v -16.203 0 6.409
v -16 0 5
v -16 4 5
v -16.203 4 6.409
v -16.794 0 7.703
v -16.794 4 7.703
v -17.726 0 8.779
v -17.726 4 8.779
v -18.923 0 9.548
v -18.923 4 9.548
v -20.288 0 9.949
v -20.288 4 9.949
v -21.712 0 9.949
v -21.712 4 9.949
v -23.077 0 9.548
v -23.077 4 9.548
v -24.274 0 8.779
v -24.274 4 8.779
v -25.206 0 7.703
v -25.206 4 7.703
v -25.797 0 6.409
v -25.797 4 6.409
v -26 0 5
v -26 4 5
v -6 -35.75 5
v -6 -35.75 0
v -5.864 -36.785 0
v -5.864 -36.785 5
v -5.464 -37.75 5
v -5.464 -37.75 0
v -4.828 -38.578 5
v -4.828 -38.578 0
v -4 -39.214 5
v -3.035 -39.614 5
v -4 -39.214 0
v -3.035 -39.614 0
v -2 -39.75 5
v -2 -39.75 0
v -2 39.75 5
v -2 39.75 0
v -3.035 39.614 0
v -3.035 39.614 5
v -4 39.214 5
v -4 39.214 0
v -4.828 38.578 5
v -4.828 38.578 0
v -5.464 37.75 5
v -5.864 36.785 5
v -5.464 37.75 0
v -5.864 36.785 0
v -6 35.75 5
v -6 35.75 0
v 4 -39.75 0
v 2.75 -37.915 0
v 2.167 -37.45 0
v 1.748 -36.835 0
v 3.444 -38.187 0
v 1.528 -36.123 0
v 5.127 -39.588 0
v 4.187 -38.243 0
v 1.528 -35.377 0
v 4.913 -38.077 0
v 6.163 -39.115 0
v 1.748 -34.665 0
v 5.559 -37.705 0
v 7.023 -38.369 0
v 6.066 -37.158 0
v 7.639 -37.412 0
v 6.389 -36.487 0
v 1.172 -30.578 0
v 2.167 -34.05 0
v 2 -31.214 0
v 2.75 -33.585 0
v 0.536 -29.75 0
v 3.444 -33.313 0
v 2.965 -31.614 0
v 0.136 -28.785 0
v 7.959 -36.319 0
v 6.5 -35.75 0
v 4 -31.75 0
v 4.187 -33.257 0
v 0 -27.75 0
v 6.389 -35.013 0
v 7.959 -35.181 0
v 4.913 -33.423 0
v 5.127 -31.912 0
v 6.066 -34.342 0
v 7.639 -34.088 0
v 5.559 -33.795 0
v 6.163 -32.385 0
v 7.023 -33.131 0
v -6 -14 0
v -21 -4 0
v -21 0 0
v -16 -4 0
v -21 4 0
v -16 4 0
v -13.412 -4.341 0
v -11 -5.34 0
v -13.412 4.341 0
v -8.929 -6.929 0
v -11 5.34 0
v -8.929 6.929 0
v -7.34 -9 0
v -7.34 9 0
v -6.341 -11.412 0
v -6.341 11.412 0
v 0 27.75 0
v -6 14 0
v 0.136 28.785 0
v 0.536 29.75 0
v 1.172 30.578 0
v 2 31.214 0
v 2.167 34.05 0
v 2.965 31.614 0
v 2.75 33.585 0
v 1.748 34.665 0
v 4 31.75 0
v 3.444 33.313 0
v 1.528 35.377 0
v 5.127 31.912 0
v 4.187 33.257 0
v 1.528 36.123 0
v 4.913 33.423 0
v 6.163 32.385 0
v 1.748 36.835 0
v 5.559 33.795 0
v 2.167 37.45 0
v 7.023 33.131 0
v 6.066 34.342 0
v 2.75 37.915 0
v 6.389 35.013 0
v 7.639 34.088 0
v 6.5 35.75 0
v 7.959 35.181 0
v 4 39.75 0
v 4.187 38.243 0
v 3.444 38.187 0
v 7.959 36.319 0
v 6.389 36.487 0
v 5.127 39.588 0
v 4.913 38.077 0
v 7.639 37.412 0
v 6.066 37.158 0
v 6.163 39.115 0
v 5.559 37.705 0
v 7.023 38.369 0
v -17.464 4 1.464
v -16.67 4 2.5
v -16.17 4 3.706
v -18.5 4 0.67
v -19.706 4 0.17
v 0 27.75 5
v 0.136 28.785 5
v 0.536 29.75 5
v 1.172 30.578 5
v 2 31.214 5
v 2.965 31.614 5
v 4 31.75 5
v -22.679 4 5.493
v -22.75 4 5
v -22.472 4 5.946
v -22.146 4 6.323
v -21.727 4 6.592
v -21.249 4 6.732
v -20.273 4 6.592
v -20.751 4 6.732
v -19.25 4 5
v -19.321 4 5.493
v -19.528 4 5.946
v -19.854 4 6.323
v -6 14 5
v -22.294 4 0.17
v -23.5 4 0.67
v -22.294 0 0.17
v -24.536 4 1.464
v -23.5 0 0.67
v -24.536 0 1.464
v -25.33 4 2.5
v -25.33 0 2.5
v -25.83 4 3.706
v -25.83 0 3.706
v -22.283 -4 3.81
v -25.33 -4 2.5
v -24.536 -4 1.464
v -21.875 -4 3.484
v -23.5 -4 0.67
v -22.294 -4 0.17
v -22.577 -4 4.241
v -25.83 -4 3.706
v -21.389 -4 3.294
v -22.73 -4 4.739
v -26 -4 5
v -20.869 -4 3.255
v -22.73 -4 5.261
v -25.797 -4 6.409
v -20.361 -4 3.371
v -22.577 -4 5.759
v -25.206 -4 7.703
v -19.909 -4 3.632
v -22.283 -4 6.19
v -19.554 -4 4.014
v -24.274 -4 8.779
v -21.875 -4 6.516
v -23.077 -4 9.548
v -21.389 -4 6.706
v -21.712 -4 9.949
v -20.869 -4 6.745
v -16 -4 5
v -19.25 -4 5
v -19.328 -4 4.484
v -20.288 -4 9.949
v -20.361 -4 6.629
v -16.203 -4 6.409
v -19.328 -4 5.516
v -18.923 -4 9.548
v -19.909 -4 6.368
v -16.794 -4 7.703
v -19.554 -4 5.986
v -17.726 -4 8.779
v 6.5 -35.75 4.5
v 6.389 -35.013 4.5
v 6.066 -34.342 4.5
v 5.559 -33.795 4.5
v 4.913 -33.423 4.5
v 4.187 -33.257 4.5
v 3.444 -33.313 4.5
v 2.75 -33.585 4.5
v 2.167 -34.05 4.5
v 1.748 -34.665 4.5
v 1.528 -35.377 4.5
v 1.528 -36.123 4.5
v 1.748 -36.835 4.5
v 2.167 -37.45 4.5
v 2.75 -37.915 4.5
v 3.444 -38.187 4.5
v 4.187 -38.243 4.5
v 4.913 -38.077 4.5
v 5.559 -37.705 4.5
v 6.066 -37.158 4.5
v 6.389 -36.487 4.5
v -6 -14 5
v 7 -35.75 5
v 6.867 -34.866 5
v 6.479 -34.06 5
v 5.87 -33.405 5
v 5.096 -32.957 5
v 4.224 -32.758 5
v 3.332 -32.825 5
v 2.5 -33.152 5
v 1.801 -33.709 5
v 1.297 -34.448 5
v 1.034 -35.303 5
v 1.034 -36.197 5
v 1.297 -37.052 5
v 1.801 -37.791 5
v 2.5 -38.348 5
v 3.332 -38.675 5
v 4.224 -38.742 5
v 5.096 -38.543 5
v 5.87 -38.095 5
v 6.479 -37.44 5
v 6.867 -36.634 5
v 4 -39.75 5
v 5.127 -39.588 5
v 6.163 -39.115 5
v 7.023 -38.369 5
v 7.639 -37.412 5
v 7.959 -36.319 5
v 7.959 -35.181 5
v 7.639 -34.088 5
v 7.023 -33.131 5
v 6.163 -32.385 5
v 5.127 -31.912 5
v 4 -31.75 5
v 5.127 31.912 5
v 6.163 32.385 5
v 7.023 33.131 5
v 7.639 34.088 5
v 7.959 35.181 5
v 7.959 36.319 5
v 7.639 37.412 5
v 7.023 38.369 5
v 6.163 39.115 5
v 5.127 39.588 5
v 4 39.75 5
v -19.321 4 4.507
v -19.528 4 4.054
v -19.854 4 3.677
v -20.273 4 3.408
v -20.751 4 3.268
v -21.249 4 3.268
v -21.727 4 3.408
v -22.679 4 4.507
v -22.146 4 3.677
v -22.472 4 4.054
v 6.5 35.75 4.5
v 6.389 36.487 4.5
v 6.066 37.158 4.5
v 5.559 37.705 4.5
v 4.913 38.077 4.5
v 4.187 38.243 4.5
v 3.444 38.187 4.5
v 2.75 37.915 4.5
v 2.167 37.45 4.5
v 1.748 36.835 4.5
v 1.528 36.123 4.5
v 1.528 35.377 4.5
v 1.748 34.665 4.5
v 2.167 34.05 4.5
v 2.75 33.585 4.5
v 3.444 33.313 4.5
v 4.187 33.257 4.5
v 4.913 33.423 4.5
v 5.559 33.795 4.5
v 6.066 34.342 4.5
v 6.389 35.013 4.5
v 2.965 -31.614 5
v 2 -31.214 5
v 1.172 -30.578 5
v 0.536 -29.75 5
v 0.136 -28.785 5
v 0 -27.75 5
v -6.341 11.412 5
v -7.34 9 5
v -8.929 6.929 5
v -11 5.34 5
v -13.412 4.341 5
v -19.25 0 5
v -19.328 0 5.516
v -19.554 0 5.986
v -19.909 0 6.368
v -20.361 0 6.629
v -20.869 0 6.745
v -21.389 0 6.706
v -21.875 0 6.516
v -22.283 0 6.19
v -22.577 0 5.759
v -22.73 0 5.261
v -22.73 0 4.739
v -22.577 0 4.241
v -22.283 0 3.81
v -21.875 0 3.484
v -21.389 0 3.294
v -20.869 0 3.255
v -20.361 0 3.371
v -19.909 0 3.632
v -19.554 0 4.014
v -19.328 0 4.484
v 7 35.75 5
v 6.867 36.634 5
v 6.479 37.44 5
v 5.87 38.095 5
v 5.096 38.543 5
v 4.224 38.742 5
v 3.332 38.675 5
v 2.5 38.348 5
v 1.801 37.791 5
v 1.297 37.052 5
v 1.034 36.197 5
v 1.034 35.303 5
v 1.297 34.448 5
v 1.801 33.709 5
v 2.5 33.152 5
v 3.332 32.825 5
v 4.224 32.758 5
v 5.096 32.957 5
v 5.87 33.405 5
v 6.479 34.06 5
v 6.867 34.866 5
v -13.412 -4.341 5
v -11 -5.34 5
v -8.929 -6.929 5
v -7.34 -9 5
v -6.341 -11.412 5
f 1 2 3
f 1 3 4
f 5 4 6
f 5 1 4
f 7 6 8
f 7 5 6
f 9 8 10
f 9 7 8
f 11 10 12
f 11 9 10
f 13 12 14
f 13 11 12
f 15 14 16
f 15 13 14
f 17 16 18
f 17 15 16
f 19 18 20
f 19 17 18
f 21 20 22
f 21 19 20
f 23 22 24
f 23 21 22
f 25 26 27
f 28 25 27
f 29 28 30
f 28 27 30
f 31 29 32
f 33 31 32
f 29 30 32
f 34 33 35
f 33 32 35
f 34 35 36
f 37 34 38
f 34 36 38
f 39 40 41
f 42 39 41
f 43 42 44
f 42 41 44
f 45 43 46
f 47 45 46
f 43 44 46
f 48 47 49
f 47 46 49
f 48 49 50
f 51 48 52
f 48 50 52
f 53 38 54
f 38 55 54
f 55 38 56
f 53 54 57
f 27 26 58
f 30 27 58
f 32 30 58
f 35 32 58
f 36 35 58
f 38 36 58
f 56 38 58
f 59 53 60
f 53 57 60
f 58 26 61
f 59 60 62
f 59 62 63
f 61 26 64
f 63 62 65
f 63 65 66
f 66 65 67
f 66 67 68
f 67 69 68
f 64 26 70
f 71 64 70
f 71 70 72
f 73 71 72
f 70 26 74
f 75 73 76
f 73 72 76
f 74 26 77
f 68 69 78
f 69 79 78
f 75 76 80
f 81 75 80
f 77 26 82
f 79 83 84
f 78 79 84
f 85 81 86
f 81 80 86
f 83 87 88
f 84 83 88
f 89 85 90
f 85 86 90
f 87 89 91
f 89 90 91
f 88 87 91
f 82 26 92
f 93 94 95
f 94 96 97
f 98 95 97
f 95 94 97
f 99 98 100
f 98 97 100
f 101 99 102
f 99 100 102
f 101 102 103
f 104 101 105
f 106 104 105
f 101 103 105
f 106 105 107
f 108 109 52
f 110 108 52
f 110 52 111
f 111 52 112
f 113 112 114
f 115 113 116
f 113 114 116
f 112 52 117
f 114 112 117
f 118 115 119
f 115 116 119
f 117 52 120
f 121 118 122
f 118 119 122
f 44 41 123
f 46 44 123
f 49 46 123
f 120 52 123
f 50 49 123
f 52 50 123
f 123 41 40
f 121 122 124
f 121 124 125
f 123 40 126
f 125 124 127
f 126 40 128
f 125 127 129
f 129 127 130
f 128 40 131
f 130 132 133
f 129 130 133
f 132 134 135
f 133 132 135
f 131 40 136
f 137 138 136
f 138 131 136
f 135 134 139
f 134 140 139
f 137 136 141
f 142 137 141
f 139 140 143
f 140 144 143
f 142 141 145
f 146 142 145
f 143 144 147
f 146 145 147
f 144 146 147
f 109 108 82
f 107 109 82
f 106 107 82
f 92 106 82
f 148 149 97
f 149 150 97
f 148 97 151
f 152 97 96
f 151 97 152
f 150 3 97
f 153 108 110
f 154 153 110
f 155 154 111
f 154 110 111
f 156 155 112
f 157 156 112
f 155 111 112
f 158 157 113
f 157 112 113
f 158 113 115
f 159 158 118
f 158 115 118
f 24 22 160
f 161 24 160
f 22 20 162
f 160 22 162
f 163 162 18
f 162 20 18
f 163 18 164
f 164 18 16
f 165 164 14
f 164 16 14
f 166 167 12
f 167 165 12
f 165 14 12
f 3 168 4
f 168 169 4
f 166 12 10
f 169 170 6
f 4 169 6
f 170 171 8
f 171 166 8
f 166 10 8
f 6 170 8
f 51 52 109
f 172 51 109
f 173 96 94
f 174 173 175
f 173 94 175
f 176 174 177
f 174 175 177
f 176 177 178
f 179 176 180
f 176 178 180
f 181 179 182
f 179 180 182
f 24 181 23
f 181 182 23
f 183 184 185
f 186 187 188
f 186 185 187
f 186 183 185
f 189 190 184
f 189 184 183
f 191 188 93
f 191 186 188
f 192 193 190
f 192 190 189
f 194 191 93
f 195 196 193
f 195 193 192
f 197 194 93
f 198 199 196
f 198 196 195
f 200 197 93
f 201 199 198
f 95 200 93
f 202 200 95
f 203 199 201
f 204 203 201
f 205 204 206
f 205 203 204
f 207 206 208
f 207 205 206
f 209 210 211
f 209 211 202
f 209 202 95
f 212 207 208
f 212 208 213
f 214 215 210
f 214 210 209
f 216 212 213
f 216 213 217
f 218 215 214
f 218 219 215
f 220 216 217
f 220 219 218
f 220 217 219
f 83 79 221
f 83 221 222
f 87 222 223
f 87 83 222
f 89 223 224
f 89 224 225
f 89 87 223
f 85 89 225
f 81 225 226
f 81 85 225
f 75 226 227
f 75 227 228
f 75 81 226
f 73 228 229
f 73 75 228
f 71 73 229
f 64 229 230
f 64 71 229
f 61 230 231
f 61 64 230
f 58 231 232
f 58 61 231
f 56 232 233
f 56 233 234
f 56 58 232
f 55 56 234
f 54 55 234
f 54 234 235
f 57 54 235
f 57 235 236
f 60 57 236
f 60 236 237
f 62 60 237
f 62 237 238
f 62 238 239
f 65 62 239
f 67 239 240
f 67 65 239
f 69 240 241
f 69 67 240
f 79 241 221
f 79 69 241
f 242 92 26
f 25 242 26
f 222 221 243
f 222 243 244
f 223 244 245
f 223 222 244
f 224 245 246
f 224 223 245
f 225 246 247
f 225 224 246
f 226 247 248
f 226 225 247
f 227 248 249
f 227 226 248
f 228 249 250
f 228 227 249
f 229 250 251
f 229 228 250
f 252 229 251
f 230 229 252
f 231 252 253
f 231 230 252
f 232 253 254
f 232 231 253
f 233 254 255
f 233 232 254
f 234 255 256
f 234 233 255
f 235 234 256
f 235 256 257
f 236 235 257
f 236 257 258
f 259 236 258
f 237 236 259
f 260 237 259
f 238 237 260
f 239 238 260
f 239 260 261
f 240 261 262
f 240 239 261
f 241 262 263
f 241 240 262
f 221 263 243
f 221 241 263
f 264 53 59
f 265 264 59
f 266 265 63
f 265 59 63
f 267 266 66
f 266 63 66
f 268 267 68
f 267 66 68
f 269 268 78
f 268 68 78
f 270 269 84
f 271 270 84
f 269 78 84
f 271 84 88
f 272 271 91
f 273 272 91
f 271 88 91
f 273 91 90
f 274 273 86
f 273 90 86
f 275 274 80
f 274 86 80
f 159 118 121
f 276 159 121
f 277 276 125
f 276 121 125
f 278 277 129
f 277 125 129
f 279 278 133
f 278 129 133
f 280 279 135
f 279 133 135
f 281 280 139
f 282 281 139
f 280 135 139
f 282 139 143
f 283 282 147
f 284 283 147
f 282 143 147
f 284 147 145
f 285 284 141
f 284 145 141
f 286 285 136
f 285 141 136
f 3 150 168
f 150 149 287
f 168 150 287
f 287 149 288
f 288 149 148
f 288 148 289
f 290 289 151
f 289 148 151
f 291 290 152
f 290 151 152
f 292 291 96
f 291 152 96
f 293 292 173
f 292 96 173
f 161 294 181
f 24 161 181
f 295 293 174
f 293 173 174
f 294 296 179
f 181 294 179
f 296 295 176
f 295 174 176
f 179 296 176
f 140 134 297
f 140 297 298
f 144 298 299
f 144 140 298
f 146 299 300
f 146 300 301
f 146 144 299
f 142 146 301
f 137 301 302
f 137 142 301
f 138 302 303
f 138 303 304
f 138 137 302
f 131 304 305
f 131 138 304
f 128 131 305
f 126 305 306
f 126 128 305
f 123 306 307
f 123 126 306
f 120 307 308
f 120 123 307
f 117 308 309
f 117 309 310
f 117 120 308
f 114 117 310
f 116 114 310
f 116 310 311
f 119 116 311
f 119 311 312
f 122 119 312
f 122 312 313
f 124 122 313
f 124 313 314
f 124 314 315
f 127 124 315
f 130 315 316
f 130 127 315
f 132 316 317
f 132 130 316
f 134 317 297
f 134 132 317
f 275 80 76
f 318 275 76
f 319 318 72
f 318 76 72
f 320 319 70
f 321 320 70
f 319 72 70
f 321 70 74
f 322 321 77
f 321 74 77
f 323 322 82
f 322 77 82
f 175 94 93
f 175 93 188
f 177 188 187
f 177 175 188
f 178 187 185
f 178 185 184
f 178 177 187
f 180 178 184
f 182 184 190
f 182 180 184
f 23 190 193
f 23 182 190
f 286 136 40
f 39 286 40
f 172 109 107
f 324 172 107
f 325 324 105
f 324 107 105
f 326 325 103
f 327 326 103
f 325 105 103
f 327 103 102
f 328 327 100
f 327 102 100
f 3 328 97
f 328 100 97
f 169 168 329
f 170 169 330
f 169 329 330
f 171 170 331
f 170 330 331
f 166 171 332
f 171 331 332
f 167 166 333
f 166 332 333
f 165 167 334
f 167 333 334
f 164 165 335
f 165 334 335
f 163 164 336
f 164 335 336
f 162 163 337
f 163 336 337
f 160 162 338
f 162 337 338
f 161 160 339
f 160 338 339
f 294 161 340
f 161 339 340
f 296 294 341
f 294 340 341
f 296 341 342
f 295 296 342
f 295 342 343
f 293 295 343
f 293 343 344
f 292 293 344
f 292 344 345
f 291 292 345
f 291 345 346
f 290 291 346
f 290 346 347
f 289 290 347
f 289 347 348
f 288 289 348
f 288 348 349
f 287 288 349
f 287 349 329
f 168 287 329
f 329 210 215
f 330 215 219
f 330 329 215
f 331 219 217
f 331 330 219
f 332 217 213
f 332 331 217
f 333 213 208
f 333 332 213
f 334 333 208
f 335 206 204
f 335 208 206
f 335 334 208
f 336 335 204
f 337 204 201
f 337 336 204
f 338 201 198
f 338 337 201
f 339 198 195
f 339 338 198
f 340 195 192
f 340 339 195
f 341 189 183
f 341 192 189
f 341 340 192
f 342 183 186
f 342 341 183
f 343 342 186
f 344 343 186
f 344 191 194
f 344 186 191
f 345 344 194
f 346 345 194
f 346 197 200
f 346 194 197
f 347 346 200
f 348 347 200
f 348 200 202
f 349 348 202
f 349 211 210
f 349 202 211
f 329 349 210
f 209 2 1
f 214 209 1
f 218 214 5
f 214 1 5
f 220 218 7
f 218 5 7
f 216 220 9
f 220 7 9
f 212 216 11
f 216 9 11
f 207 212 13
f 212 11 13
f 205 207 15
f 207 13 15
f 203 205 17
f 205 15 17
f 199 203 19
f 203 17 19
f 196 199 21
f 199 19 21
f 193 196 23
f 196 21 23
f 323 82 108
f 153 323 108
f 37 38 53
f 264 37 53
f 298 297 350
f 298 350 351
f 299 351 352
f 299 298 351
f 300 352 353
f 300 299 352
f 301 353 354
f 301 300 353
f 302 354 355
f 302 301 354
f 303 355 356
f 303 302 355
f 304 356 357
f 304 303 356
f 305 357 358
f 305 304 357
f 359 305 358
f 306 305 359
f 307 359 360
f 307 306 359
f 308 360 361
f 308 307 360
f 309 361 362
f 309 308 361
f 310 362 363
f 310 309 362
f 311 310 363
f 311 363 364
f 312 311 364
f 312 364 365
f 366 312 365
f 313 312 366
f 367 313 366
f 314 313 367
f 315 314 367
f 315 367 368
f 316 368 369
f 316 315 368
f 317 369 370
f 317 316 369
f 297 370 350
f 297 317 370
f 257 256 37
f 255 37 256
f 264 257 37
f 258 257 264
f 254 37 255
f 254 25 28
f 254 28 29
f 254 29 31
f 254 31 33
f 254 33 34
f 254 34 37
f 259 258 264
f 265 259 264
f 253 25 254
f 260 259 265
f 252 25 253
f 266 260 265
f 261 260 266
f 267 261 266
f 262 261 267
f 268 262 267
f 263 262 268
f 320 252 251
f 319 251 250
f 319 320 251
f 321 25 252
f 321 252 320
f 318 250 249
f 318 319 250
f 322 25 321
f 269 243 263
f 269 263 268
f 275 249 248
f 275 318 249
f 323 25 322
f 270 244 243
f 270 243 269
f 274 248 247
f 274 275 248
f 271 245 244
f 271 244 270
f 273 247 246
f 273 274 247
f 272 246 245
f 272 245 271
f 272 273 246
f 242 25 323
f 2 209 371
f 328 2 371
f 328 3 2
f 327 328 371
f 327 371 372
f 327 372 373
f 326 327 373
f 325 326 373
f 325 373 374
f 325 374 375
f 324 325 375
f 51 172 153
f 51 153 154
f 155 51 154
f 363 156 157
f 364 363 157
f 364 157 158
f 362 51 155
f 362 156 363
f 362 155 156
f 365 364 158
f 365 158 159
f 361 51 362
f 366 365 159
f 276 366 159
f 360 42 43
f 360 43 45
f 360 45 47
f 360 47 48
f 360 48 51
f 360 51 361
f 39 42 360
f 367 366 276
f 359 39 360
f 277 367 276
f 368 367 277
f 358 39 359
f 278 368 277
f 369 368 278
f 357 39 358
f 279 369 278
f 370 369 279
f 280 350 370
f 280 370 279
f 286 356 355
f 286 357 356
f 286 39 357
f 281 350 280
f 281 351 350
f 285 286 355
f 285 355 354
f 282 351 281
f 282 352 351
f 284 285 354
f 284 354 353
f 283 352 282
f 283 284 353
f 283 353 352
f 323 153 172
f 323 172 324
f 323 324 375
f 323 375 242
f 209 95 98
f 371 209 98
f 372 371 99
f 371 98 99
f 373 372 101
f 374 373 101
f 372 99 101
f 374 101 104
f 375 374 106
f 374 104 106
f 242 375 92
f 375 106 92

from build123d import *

# Parameters (mm, degrees)
F0_R          = 2.5
F1_DEPTH      = 5
F2_R          = 5
F3_DEPTH      = 4
F3_DEPTH_BACK = 4
F4_R          = 1.75
F5_DEPTH      = 39.751
F5_DEPTH_BACK = 39.751
F6_SIZE       = 0.5


# Not quite as in the source:
# - after a boolean that leaves OpenCascade's solid faulty, fix() repairs it


with BuildPart() as f1:
    # F0 (on Top) → F1 (new body)
    with BuildSketch(Plane.XY):
        with BuildLine():
            Line((-16, 4), (-26, 4))
            Line((-26, 4), (-26, 0))
            Line((-26, 0), (-26, -4))
            Line((-26, -4), (-16, -4))
            ThreePointArc((-16, -4), (-8.9289321881, -6.9289321881), (-6, -14))
            Line((-6, -14), (-6, -35.75))
            ThreePointArc((-6, -35.75), (-4.8284271247, -38.5784271247), (-2, -39.75))
            Line((-2, -39.75), (4, -39.75))
            ThreePointArc((4, -39.75), (8, -35.75), (4, -31.75))
            ThreePointArc((4, -31.75), (1.1715728753, -30.5784271247), (0, -27.75))
            Line((0, -27.75), (0, 0))
            Line((0, 0), (0, 27.75))
            ThreePointArc((0, 27.75), (1.1715728753, 30.5784271247), (4, 31.75))
            ThreePointArc((4, 31.75), (8, 35.75), (4, 39.75))
            Line((4, 39.75), (-2, 39.75))
            ThreePointArc((-2, 39.75), (-4.8284271247, 38.5784271247), (-6, 35.75))
            Line((-6, 35.75), (-6, 14))
            ThreePointArc((-6, 14), (-8.9289321881, 6.9289321881), (-16, 4))
        make_face()
        with Locations((4, -35.75)):
            Circle(F0_R, mode=Mode.SUBTRACT)
        with Locations((4, 35.75)):
            Circle(F0_R, mode=Mode.SUBTRACT)
    extrude(amount=F1_DEPTH)

    # F2 (on Front) → F3 (join, two sides)
    with BuildSketch(Plane.XZ) as f3_sk:
        with Locations((-21, 5)):
            Circle(F2_R)
    extrude(amount=F3_DEPTH)
    extrude(f3_sk.sketch, amount=-F3_DEPTH_BACK)

    # F4 (on Front) → F5 (cut, two sides)
    with BuildSketch(Plane.XZ) as f5_sk:
        with BuildLine():
            ThreePointArc((-21, 0), (-24.5355339059, 1.4644660941), (-26, 5))
            Line((-26, 5), (-26, 0))
            Line((-26, 0), (-21, 0))
        make_face()
        with Locations((-21, 5)):
            Circle(F4_R)
    extrude(amount=-F5_DEPTH, mode=Mode.SUBTRACT)
    extrude(f5_sk.sketch, amount=F5_DEPTH_BACK, mode=Mode.SUBTRACT)

    add(f1.part.fix(), mode=Mode.REPLACE)

    # F6
    f6_edges = [f1.edges().sort_by_distance(p)[0] for p in [
        (1.5, 35.75, 5),
        (1.5, -35.75, 5),
    ]]
    chamfer(f6_edges, length=F6_SIZE)


solid = f1.part
